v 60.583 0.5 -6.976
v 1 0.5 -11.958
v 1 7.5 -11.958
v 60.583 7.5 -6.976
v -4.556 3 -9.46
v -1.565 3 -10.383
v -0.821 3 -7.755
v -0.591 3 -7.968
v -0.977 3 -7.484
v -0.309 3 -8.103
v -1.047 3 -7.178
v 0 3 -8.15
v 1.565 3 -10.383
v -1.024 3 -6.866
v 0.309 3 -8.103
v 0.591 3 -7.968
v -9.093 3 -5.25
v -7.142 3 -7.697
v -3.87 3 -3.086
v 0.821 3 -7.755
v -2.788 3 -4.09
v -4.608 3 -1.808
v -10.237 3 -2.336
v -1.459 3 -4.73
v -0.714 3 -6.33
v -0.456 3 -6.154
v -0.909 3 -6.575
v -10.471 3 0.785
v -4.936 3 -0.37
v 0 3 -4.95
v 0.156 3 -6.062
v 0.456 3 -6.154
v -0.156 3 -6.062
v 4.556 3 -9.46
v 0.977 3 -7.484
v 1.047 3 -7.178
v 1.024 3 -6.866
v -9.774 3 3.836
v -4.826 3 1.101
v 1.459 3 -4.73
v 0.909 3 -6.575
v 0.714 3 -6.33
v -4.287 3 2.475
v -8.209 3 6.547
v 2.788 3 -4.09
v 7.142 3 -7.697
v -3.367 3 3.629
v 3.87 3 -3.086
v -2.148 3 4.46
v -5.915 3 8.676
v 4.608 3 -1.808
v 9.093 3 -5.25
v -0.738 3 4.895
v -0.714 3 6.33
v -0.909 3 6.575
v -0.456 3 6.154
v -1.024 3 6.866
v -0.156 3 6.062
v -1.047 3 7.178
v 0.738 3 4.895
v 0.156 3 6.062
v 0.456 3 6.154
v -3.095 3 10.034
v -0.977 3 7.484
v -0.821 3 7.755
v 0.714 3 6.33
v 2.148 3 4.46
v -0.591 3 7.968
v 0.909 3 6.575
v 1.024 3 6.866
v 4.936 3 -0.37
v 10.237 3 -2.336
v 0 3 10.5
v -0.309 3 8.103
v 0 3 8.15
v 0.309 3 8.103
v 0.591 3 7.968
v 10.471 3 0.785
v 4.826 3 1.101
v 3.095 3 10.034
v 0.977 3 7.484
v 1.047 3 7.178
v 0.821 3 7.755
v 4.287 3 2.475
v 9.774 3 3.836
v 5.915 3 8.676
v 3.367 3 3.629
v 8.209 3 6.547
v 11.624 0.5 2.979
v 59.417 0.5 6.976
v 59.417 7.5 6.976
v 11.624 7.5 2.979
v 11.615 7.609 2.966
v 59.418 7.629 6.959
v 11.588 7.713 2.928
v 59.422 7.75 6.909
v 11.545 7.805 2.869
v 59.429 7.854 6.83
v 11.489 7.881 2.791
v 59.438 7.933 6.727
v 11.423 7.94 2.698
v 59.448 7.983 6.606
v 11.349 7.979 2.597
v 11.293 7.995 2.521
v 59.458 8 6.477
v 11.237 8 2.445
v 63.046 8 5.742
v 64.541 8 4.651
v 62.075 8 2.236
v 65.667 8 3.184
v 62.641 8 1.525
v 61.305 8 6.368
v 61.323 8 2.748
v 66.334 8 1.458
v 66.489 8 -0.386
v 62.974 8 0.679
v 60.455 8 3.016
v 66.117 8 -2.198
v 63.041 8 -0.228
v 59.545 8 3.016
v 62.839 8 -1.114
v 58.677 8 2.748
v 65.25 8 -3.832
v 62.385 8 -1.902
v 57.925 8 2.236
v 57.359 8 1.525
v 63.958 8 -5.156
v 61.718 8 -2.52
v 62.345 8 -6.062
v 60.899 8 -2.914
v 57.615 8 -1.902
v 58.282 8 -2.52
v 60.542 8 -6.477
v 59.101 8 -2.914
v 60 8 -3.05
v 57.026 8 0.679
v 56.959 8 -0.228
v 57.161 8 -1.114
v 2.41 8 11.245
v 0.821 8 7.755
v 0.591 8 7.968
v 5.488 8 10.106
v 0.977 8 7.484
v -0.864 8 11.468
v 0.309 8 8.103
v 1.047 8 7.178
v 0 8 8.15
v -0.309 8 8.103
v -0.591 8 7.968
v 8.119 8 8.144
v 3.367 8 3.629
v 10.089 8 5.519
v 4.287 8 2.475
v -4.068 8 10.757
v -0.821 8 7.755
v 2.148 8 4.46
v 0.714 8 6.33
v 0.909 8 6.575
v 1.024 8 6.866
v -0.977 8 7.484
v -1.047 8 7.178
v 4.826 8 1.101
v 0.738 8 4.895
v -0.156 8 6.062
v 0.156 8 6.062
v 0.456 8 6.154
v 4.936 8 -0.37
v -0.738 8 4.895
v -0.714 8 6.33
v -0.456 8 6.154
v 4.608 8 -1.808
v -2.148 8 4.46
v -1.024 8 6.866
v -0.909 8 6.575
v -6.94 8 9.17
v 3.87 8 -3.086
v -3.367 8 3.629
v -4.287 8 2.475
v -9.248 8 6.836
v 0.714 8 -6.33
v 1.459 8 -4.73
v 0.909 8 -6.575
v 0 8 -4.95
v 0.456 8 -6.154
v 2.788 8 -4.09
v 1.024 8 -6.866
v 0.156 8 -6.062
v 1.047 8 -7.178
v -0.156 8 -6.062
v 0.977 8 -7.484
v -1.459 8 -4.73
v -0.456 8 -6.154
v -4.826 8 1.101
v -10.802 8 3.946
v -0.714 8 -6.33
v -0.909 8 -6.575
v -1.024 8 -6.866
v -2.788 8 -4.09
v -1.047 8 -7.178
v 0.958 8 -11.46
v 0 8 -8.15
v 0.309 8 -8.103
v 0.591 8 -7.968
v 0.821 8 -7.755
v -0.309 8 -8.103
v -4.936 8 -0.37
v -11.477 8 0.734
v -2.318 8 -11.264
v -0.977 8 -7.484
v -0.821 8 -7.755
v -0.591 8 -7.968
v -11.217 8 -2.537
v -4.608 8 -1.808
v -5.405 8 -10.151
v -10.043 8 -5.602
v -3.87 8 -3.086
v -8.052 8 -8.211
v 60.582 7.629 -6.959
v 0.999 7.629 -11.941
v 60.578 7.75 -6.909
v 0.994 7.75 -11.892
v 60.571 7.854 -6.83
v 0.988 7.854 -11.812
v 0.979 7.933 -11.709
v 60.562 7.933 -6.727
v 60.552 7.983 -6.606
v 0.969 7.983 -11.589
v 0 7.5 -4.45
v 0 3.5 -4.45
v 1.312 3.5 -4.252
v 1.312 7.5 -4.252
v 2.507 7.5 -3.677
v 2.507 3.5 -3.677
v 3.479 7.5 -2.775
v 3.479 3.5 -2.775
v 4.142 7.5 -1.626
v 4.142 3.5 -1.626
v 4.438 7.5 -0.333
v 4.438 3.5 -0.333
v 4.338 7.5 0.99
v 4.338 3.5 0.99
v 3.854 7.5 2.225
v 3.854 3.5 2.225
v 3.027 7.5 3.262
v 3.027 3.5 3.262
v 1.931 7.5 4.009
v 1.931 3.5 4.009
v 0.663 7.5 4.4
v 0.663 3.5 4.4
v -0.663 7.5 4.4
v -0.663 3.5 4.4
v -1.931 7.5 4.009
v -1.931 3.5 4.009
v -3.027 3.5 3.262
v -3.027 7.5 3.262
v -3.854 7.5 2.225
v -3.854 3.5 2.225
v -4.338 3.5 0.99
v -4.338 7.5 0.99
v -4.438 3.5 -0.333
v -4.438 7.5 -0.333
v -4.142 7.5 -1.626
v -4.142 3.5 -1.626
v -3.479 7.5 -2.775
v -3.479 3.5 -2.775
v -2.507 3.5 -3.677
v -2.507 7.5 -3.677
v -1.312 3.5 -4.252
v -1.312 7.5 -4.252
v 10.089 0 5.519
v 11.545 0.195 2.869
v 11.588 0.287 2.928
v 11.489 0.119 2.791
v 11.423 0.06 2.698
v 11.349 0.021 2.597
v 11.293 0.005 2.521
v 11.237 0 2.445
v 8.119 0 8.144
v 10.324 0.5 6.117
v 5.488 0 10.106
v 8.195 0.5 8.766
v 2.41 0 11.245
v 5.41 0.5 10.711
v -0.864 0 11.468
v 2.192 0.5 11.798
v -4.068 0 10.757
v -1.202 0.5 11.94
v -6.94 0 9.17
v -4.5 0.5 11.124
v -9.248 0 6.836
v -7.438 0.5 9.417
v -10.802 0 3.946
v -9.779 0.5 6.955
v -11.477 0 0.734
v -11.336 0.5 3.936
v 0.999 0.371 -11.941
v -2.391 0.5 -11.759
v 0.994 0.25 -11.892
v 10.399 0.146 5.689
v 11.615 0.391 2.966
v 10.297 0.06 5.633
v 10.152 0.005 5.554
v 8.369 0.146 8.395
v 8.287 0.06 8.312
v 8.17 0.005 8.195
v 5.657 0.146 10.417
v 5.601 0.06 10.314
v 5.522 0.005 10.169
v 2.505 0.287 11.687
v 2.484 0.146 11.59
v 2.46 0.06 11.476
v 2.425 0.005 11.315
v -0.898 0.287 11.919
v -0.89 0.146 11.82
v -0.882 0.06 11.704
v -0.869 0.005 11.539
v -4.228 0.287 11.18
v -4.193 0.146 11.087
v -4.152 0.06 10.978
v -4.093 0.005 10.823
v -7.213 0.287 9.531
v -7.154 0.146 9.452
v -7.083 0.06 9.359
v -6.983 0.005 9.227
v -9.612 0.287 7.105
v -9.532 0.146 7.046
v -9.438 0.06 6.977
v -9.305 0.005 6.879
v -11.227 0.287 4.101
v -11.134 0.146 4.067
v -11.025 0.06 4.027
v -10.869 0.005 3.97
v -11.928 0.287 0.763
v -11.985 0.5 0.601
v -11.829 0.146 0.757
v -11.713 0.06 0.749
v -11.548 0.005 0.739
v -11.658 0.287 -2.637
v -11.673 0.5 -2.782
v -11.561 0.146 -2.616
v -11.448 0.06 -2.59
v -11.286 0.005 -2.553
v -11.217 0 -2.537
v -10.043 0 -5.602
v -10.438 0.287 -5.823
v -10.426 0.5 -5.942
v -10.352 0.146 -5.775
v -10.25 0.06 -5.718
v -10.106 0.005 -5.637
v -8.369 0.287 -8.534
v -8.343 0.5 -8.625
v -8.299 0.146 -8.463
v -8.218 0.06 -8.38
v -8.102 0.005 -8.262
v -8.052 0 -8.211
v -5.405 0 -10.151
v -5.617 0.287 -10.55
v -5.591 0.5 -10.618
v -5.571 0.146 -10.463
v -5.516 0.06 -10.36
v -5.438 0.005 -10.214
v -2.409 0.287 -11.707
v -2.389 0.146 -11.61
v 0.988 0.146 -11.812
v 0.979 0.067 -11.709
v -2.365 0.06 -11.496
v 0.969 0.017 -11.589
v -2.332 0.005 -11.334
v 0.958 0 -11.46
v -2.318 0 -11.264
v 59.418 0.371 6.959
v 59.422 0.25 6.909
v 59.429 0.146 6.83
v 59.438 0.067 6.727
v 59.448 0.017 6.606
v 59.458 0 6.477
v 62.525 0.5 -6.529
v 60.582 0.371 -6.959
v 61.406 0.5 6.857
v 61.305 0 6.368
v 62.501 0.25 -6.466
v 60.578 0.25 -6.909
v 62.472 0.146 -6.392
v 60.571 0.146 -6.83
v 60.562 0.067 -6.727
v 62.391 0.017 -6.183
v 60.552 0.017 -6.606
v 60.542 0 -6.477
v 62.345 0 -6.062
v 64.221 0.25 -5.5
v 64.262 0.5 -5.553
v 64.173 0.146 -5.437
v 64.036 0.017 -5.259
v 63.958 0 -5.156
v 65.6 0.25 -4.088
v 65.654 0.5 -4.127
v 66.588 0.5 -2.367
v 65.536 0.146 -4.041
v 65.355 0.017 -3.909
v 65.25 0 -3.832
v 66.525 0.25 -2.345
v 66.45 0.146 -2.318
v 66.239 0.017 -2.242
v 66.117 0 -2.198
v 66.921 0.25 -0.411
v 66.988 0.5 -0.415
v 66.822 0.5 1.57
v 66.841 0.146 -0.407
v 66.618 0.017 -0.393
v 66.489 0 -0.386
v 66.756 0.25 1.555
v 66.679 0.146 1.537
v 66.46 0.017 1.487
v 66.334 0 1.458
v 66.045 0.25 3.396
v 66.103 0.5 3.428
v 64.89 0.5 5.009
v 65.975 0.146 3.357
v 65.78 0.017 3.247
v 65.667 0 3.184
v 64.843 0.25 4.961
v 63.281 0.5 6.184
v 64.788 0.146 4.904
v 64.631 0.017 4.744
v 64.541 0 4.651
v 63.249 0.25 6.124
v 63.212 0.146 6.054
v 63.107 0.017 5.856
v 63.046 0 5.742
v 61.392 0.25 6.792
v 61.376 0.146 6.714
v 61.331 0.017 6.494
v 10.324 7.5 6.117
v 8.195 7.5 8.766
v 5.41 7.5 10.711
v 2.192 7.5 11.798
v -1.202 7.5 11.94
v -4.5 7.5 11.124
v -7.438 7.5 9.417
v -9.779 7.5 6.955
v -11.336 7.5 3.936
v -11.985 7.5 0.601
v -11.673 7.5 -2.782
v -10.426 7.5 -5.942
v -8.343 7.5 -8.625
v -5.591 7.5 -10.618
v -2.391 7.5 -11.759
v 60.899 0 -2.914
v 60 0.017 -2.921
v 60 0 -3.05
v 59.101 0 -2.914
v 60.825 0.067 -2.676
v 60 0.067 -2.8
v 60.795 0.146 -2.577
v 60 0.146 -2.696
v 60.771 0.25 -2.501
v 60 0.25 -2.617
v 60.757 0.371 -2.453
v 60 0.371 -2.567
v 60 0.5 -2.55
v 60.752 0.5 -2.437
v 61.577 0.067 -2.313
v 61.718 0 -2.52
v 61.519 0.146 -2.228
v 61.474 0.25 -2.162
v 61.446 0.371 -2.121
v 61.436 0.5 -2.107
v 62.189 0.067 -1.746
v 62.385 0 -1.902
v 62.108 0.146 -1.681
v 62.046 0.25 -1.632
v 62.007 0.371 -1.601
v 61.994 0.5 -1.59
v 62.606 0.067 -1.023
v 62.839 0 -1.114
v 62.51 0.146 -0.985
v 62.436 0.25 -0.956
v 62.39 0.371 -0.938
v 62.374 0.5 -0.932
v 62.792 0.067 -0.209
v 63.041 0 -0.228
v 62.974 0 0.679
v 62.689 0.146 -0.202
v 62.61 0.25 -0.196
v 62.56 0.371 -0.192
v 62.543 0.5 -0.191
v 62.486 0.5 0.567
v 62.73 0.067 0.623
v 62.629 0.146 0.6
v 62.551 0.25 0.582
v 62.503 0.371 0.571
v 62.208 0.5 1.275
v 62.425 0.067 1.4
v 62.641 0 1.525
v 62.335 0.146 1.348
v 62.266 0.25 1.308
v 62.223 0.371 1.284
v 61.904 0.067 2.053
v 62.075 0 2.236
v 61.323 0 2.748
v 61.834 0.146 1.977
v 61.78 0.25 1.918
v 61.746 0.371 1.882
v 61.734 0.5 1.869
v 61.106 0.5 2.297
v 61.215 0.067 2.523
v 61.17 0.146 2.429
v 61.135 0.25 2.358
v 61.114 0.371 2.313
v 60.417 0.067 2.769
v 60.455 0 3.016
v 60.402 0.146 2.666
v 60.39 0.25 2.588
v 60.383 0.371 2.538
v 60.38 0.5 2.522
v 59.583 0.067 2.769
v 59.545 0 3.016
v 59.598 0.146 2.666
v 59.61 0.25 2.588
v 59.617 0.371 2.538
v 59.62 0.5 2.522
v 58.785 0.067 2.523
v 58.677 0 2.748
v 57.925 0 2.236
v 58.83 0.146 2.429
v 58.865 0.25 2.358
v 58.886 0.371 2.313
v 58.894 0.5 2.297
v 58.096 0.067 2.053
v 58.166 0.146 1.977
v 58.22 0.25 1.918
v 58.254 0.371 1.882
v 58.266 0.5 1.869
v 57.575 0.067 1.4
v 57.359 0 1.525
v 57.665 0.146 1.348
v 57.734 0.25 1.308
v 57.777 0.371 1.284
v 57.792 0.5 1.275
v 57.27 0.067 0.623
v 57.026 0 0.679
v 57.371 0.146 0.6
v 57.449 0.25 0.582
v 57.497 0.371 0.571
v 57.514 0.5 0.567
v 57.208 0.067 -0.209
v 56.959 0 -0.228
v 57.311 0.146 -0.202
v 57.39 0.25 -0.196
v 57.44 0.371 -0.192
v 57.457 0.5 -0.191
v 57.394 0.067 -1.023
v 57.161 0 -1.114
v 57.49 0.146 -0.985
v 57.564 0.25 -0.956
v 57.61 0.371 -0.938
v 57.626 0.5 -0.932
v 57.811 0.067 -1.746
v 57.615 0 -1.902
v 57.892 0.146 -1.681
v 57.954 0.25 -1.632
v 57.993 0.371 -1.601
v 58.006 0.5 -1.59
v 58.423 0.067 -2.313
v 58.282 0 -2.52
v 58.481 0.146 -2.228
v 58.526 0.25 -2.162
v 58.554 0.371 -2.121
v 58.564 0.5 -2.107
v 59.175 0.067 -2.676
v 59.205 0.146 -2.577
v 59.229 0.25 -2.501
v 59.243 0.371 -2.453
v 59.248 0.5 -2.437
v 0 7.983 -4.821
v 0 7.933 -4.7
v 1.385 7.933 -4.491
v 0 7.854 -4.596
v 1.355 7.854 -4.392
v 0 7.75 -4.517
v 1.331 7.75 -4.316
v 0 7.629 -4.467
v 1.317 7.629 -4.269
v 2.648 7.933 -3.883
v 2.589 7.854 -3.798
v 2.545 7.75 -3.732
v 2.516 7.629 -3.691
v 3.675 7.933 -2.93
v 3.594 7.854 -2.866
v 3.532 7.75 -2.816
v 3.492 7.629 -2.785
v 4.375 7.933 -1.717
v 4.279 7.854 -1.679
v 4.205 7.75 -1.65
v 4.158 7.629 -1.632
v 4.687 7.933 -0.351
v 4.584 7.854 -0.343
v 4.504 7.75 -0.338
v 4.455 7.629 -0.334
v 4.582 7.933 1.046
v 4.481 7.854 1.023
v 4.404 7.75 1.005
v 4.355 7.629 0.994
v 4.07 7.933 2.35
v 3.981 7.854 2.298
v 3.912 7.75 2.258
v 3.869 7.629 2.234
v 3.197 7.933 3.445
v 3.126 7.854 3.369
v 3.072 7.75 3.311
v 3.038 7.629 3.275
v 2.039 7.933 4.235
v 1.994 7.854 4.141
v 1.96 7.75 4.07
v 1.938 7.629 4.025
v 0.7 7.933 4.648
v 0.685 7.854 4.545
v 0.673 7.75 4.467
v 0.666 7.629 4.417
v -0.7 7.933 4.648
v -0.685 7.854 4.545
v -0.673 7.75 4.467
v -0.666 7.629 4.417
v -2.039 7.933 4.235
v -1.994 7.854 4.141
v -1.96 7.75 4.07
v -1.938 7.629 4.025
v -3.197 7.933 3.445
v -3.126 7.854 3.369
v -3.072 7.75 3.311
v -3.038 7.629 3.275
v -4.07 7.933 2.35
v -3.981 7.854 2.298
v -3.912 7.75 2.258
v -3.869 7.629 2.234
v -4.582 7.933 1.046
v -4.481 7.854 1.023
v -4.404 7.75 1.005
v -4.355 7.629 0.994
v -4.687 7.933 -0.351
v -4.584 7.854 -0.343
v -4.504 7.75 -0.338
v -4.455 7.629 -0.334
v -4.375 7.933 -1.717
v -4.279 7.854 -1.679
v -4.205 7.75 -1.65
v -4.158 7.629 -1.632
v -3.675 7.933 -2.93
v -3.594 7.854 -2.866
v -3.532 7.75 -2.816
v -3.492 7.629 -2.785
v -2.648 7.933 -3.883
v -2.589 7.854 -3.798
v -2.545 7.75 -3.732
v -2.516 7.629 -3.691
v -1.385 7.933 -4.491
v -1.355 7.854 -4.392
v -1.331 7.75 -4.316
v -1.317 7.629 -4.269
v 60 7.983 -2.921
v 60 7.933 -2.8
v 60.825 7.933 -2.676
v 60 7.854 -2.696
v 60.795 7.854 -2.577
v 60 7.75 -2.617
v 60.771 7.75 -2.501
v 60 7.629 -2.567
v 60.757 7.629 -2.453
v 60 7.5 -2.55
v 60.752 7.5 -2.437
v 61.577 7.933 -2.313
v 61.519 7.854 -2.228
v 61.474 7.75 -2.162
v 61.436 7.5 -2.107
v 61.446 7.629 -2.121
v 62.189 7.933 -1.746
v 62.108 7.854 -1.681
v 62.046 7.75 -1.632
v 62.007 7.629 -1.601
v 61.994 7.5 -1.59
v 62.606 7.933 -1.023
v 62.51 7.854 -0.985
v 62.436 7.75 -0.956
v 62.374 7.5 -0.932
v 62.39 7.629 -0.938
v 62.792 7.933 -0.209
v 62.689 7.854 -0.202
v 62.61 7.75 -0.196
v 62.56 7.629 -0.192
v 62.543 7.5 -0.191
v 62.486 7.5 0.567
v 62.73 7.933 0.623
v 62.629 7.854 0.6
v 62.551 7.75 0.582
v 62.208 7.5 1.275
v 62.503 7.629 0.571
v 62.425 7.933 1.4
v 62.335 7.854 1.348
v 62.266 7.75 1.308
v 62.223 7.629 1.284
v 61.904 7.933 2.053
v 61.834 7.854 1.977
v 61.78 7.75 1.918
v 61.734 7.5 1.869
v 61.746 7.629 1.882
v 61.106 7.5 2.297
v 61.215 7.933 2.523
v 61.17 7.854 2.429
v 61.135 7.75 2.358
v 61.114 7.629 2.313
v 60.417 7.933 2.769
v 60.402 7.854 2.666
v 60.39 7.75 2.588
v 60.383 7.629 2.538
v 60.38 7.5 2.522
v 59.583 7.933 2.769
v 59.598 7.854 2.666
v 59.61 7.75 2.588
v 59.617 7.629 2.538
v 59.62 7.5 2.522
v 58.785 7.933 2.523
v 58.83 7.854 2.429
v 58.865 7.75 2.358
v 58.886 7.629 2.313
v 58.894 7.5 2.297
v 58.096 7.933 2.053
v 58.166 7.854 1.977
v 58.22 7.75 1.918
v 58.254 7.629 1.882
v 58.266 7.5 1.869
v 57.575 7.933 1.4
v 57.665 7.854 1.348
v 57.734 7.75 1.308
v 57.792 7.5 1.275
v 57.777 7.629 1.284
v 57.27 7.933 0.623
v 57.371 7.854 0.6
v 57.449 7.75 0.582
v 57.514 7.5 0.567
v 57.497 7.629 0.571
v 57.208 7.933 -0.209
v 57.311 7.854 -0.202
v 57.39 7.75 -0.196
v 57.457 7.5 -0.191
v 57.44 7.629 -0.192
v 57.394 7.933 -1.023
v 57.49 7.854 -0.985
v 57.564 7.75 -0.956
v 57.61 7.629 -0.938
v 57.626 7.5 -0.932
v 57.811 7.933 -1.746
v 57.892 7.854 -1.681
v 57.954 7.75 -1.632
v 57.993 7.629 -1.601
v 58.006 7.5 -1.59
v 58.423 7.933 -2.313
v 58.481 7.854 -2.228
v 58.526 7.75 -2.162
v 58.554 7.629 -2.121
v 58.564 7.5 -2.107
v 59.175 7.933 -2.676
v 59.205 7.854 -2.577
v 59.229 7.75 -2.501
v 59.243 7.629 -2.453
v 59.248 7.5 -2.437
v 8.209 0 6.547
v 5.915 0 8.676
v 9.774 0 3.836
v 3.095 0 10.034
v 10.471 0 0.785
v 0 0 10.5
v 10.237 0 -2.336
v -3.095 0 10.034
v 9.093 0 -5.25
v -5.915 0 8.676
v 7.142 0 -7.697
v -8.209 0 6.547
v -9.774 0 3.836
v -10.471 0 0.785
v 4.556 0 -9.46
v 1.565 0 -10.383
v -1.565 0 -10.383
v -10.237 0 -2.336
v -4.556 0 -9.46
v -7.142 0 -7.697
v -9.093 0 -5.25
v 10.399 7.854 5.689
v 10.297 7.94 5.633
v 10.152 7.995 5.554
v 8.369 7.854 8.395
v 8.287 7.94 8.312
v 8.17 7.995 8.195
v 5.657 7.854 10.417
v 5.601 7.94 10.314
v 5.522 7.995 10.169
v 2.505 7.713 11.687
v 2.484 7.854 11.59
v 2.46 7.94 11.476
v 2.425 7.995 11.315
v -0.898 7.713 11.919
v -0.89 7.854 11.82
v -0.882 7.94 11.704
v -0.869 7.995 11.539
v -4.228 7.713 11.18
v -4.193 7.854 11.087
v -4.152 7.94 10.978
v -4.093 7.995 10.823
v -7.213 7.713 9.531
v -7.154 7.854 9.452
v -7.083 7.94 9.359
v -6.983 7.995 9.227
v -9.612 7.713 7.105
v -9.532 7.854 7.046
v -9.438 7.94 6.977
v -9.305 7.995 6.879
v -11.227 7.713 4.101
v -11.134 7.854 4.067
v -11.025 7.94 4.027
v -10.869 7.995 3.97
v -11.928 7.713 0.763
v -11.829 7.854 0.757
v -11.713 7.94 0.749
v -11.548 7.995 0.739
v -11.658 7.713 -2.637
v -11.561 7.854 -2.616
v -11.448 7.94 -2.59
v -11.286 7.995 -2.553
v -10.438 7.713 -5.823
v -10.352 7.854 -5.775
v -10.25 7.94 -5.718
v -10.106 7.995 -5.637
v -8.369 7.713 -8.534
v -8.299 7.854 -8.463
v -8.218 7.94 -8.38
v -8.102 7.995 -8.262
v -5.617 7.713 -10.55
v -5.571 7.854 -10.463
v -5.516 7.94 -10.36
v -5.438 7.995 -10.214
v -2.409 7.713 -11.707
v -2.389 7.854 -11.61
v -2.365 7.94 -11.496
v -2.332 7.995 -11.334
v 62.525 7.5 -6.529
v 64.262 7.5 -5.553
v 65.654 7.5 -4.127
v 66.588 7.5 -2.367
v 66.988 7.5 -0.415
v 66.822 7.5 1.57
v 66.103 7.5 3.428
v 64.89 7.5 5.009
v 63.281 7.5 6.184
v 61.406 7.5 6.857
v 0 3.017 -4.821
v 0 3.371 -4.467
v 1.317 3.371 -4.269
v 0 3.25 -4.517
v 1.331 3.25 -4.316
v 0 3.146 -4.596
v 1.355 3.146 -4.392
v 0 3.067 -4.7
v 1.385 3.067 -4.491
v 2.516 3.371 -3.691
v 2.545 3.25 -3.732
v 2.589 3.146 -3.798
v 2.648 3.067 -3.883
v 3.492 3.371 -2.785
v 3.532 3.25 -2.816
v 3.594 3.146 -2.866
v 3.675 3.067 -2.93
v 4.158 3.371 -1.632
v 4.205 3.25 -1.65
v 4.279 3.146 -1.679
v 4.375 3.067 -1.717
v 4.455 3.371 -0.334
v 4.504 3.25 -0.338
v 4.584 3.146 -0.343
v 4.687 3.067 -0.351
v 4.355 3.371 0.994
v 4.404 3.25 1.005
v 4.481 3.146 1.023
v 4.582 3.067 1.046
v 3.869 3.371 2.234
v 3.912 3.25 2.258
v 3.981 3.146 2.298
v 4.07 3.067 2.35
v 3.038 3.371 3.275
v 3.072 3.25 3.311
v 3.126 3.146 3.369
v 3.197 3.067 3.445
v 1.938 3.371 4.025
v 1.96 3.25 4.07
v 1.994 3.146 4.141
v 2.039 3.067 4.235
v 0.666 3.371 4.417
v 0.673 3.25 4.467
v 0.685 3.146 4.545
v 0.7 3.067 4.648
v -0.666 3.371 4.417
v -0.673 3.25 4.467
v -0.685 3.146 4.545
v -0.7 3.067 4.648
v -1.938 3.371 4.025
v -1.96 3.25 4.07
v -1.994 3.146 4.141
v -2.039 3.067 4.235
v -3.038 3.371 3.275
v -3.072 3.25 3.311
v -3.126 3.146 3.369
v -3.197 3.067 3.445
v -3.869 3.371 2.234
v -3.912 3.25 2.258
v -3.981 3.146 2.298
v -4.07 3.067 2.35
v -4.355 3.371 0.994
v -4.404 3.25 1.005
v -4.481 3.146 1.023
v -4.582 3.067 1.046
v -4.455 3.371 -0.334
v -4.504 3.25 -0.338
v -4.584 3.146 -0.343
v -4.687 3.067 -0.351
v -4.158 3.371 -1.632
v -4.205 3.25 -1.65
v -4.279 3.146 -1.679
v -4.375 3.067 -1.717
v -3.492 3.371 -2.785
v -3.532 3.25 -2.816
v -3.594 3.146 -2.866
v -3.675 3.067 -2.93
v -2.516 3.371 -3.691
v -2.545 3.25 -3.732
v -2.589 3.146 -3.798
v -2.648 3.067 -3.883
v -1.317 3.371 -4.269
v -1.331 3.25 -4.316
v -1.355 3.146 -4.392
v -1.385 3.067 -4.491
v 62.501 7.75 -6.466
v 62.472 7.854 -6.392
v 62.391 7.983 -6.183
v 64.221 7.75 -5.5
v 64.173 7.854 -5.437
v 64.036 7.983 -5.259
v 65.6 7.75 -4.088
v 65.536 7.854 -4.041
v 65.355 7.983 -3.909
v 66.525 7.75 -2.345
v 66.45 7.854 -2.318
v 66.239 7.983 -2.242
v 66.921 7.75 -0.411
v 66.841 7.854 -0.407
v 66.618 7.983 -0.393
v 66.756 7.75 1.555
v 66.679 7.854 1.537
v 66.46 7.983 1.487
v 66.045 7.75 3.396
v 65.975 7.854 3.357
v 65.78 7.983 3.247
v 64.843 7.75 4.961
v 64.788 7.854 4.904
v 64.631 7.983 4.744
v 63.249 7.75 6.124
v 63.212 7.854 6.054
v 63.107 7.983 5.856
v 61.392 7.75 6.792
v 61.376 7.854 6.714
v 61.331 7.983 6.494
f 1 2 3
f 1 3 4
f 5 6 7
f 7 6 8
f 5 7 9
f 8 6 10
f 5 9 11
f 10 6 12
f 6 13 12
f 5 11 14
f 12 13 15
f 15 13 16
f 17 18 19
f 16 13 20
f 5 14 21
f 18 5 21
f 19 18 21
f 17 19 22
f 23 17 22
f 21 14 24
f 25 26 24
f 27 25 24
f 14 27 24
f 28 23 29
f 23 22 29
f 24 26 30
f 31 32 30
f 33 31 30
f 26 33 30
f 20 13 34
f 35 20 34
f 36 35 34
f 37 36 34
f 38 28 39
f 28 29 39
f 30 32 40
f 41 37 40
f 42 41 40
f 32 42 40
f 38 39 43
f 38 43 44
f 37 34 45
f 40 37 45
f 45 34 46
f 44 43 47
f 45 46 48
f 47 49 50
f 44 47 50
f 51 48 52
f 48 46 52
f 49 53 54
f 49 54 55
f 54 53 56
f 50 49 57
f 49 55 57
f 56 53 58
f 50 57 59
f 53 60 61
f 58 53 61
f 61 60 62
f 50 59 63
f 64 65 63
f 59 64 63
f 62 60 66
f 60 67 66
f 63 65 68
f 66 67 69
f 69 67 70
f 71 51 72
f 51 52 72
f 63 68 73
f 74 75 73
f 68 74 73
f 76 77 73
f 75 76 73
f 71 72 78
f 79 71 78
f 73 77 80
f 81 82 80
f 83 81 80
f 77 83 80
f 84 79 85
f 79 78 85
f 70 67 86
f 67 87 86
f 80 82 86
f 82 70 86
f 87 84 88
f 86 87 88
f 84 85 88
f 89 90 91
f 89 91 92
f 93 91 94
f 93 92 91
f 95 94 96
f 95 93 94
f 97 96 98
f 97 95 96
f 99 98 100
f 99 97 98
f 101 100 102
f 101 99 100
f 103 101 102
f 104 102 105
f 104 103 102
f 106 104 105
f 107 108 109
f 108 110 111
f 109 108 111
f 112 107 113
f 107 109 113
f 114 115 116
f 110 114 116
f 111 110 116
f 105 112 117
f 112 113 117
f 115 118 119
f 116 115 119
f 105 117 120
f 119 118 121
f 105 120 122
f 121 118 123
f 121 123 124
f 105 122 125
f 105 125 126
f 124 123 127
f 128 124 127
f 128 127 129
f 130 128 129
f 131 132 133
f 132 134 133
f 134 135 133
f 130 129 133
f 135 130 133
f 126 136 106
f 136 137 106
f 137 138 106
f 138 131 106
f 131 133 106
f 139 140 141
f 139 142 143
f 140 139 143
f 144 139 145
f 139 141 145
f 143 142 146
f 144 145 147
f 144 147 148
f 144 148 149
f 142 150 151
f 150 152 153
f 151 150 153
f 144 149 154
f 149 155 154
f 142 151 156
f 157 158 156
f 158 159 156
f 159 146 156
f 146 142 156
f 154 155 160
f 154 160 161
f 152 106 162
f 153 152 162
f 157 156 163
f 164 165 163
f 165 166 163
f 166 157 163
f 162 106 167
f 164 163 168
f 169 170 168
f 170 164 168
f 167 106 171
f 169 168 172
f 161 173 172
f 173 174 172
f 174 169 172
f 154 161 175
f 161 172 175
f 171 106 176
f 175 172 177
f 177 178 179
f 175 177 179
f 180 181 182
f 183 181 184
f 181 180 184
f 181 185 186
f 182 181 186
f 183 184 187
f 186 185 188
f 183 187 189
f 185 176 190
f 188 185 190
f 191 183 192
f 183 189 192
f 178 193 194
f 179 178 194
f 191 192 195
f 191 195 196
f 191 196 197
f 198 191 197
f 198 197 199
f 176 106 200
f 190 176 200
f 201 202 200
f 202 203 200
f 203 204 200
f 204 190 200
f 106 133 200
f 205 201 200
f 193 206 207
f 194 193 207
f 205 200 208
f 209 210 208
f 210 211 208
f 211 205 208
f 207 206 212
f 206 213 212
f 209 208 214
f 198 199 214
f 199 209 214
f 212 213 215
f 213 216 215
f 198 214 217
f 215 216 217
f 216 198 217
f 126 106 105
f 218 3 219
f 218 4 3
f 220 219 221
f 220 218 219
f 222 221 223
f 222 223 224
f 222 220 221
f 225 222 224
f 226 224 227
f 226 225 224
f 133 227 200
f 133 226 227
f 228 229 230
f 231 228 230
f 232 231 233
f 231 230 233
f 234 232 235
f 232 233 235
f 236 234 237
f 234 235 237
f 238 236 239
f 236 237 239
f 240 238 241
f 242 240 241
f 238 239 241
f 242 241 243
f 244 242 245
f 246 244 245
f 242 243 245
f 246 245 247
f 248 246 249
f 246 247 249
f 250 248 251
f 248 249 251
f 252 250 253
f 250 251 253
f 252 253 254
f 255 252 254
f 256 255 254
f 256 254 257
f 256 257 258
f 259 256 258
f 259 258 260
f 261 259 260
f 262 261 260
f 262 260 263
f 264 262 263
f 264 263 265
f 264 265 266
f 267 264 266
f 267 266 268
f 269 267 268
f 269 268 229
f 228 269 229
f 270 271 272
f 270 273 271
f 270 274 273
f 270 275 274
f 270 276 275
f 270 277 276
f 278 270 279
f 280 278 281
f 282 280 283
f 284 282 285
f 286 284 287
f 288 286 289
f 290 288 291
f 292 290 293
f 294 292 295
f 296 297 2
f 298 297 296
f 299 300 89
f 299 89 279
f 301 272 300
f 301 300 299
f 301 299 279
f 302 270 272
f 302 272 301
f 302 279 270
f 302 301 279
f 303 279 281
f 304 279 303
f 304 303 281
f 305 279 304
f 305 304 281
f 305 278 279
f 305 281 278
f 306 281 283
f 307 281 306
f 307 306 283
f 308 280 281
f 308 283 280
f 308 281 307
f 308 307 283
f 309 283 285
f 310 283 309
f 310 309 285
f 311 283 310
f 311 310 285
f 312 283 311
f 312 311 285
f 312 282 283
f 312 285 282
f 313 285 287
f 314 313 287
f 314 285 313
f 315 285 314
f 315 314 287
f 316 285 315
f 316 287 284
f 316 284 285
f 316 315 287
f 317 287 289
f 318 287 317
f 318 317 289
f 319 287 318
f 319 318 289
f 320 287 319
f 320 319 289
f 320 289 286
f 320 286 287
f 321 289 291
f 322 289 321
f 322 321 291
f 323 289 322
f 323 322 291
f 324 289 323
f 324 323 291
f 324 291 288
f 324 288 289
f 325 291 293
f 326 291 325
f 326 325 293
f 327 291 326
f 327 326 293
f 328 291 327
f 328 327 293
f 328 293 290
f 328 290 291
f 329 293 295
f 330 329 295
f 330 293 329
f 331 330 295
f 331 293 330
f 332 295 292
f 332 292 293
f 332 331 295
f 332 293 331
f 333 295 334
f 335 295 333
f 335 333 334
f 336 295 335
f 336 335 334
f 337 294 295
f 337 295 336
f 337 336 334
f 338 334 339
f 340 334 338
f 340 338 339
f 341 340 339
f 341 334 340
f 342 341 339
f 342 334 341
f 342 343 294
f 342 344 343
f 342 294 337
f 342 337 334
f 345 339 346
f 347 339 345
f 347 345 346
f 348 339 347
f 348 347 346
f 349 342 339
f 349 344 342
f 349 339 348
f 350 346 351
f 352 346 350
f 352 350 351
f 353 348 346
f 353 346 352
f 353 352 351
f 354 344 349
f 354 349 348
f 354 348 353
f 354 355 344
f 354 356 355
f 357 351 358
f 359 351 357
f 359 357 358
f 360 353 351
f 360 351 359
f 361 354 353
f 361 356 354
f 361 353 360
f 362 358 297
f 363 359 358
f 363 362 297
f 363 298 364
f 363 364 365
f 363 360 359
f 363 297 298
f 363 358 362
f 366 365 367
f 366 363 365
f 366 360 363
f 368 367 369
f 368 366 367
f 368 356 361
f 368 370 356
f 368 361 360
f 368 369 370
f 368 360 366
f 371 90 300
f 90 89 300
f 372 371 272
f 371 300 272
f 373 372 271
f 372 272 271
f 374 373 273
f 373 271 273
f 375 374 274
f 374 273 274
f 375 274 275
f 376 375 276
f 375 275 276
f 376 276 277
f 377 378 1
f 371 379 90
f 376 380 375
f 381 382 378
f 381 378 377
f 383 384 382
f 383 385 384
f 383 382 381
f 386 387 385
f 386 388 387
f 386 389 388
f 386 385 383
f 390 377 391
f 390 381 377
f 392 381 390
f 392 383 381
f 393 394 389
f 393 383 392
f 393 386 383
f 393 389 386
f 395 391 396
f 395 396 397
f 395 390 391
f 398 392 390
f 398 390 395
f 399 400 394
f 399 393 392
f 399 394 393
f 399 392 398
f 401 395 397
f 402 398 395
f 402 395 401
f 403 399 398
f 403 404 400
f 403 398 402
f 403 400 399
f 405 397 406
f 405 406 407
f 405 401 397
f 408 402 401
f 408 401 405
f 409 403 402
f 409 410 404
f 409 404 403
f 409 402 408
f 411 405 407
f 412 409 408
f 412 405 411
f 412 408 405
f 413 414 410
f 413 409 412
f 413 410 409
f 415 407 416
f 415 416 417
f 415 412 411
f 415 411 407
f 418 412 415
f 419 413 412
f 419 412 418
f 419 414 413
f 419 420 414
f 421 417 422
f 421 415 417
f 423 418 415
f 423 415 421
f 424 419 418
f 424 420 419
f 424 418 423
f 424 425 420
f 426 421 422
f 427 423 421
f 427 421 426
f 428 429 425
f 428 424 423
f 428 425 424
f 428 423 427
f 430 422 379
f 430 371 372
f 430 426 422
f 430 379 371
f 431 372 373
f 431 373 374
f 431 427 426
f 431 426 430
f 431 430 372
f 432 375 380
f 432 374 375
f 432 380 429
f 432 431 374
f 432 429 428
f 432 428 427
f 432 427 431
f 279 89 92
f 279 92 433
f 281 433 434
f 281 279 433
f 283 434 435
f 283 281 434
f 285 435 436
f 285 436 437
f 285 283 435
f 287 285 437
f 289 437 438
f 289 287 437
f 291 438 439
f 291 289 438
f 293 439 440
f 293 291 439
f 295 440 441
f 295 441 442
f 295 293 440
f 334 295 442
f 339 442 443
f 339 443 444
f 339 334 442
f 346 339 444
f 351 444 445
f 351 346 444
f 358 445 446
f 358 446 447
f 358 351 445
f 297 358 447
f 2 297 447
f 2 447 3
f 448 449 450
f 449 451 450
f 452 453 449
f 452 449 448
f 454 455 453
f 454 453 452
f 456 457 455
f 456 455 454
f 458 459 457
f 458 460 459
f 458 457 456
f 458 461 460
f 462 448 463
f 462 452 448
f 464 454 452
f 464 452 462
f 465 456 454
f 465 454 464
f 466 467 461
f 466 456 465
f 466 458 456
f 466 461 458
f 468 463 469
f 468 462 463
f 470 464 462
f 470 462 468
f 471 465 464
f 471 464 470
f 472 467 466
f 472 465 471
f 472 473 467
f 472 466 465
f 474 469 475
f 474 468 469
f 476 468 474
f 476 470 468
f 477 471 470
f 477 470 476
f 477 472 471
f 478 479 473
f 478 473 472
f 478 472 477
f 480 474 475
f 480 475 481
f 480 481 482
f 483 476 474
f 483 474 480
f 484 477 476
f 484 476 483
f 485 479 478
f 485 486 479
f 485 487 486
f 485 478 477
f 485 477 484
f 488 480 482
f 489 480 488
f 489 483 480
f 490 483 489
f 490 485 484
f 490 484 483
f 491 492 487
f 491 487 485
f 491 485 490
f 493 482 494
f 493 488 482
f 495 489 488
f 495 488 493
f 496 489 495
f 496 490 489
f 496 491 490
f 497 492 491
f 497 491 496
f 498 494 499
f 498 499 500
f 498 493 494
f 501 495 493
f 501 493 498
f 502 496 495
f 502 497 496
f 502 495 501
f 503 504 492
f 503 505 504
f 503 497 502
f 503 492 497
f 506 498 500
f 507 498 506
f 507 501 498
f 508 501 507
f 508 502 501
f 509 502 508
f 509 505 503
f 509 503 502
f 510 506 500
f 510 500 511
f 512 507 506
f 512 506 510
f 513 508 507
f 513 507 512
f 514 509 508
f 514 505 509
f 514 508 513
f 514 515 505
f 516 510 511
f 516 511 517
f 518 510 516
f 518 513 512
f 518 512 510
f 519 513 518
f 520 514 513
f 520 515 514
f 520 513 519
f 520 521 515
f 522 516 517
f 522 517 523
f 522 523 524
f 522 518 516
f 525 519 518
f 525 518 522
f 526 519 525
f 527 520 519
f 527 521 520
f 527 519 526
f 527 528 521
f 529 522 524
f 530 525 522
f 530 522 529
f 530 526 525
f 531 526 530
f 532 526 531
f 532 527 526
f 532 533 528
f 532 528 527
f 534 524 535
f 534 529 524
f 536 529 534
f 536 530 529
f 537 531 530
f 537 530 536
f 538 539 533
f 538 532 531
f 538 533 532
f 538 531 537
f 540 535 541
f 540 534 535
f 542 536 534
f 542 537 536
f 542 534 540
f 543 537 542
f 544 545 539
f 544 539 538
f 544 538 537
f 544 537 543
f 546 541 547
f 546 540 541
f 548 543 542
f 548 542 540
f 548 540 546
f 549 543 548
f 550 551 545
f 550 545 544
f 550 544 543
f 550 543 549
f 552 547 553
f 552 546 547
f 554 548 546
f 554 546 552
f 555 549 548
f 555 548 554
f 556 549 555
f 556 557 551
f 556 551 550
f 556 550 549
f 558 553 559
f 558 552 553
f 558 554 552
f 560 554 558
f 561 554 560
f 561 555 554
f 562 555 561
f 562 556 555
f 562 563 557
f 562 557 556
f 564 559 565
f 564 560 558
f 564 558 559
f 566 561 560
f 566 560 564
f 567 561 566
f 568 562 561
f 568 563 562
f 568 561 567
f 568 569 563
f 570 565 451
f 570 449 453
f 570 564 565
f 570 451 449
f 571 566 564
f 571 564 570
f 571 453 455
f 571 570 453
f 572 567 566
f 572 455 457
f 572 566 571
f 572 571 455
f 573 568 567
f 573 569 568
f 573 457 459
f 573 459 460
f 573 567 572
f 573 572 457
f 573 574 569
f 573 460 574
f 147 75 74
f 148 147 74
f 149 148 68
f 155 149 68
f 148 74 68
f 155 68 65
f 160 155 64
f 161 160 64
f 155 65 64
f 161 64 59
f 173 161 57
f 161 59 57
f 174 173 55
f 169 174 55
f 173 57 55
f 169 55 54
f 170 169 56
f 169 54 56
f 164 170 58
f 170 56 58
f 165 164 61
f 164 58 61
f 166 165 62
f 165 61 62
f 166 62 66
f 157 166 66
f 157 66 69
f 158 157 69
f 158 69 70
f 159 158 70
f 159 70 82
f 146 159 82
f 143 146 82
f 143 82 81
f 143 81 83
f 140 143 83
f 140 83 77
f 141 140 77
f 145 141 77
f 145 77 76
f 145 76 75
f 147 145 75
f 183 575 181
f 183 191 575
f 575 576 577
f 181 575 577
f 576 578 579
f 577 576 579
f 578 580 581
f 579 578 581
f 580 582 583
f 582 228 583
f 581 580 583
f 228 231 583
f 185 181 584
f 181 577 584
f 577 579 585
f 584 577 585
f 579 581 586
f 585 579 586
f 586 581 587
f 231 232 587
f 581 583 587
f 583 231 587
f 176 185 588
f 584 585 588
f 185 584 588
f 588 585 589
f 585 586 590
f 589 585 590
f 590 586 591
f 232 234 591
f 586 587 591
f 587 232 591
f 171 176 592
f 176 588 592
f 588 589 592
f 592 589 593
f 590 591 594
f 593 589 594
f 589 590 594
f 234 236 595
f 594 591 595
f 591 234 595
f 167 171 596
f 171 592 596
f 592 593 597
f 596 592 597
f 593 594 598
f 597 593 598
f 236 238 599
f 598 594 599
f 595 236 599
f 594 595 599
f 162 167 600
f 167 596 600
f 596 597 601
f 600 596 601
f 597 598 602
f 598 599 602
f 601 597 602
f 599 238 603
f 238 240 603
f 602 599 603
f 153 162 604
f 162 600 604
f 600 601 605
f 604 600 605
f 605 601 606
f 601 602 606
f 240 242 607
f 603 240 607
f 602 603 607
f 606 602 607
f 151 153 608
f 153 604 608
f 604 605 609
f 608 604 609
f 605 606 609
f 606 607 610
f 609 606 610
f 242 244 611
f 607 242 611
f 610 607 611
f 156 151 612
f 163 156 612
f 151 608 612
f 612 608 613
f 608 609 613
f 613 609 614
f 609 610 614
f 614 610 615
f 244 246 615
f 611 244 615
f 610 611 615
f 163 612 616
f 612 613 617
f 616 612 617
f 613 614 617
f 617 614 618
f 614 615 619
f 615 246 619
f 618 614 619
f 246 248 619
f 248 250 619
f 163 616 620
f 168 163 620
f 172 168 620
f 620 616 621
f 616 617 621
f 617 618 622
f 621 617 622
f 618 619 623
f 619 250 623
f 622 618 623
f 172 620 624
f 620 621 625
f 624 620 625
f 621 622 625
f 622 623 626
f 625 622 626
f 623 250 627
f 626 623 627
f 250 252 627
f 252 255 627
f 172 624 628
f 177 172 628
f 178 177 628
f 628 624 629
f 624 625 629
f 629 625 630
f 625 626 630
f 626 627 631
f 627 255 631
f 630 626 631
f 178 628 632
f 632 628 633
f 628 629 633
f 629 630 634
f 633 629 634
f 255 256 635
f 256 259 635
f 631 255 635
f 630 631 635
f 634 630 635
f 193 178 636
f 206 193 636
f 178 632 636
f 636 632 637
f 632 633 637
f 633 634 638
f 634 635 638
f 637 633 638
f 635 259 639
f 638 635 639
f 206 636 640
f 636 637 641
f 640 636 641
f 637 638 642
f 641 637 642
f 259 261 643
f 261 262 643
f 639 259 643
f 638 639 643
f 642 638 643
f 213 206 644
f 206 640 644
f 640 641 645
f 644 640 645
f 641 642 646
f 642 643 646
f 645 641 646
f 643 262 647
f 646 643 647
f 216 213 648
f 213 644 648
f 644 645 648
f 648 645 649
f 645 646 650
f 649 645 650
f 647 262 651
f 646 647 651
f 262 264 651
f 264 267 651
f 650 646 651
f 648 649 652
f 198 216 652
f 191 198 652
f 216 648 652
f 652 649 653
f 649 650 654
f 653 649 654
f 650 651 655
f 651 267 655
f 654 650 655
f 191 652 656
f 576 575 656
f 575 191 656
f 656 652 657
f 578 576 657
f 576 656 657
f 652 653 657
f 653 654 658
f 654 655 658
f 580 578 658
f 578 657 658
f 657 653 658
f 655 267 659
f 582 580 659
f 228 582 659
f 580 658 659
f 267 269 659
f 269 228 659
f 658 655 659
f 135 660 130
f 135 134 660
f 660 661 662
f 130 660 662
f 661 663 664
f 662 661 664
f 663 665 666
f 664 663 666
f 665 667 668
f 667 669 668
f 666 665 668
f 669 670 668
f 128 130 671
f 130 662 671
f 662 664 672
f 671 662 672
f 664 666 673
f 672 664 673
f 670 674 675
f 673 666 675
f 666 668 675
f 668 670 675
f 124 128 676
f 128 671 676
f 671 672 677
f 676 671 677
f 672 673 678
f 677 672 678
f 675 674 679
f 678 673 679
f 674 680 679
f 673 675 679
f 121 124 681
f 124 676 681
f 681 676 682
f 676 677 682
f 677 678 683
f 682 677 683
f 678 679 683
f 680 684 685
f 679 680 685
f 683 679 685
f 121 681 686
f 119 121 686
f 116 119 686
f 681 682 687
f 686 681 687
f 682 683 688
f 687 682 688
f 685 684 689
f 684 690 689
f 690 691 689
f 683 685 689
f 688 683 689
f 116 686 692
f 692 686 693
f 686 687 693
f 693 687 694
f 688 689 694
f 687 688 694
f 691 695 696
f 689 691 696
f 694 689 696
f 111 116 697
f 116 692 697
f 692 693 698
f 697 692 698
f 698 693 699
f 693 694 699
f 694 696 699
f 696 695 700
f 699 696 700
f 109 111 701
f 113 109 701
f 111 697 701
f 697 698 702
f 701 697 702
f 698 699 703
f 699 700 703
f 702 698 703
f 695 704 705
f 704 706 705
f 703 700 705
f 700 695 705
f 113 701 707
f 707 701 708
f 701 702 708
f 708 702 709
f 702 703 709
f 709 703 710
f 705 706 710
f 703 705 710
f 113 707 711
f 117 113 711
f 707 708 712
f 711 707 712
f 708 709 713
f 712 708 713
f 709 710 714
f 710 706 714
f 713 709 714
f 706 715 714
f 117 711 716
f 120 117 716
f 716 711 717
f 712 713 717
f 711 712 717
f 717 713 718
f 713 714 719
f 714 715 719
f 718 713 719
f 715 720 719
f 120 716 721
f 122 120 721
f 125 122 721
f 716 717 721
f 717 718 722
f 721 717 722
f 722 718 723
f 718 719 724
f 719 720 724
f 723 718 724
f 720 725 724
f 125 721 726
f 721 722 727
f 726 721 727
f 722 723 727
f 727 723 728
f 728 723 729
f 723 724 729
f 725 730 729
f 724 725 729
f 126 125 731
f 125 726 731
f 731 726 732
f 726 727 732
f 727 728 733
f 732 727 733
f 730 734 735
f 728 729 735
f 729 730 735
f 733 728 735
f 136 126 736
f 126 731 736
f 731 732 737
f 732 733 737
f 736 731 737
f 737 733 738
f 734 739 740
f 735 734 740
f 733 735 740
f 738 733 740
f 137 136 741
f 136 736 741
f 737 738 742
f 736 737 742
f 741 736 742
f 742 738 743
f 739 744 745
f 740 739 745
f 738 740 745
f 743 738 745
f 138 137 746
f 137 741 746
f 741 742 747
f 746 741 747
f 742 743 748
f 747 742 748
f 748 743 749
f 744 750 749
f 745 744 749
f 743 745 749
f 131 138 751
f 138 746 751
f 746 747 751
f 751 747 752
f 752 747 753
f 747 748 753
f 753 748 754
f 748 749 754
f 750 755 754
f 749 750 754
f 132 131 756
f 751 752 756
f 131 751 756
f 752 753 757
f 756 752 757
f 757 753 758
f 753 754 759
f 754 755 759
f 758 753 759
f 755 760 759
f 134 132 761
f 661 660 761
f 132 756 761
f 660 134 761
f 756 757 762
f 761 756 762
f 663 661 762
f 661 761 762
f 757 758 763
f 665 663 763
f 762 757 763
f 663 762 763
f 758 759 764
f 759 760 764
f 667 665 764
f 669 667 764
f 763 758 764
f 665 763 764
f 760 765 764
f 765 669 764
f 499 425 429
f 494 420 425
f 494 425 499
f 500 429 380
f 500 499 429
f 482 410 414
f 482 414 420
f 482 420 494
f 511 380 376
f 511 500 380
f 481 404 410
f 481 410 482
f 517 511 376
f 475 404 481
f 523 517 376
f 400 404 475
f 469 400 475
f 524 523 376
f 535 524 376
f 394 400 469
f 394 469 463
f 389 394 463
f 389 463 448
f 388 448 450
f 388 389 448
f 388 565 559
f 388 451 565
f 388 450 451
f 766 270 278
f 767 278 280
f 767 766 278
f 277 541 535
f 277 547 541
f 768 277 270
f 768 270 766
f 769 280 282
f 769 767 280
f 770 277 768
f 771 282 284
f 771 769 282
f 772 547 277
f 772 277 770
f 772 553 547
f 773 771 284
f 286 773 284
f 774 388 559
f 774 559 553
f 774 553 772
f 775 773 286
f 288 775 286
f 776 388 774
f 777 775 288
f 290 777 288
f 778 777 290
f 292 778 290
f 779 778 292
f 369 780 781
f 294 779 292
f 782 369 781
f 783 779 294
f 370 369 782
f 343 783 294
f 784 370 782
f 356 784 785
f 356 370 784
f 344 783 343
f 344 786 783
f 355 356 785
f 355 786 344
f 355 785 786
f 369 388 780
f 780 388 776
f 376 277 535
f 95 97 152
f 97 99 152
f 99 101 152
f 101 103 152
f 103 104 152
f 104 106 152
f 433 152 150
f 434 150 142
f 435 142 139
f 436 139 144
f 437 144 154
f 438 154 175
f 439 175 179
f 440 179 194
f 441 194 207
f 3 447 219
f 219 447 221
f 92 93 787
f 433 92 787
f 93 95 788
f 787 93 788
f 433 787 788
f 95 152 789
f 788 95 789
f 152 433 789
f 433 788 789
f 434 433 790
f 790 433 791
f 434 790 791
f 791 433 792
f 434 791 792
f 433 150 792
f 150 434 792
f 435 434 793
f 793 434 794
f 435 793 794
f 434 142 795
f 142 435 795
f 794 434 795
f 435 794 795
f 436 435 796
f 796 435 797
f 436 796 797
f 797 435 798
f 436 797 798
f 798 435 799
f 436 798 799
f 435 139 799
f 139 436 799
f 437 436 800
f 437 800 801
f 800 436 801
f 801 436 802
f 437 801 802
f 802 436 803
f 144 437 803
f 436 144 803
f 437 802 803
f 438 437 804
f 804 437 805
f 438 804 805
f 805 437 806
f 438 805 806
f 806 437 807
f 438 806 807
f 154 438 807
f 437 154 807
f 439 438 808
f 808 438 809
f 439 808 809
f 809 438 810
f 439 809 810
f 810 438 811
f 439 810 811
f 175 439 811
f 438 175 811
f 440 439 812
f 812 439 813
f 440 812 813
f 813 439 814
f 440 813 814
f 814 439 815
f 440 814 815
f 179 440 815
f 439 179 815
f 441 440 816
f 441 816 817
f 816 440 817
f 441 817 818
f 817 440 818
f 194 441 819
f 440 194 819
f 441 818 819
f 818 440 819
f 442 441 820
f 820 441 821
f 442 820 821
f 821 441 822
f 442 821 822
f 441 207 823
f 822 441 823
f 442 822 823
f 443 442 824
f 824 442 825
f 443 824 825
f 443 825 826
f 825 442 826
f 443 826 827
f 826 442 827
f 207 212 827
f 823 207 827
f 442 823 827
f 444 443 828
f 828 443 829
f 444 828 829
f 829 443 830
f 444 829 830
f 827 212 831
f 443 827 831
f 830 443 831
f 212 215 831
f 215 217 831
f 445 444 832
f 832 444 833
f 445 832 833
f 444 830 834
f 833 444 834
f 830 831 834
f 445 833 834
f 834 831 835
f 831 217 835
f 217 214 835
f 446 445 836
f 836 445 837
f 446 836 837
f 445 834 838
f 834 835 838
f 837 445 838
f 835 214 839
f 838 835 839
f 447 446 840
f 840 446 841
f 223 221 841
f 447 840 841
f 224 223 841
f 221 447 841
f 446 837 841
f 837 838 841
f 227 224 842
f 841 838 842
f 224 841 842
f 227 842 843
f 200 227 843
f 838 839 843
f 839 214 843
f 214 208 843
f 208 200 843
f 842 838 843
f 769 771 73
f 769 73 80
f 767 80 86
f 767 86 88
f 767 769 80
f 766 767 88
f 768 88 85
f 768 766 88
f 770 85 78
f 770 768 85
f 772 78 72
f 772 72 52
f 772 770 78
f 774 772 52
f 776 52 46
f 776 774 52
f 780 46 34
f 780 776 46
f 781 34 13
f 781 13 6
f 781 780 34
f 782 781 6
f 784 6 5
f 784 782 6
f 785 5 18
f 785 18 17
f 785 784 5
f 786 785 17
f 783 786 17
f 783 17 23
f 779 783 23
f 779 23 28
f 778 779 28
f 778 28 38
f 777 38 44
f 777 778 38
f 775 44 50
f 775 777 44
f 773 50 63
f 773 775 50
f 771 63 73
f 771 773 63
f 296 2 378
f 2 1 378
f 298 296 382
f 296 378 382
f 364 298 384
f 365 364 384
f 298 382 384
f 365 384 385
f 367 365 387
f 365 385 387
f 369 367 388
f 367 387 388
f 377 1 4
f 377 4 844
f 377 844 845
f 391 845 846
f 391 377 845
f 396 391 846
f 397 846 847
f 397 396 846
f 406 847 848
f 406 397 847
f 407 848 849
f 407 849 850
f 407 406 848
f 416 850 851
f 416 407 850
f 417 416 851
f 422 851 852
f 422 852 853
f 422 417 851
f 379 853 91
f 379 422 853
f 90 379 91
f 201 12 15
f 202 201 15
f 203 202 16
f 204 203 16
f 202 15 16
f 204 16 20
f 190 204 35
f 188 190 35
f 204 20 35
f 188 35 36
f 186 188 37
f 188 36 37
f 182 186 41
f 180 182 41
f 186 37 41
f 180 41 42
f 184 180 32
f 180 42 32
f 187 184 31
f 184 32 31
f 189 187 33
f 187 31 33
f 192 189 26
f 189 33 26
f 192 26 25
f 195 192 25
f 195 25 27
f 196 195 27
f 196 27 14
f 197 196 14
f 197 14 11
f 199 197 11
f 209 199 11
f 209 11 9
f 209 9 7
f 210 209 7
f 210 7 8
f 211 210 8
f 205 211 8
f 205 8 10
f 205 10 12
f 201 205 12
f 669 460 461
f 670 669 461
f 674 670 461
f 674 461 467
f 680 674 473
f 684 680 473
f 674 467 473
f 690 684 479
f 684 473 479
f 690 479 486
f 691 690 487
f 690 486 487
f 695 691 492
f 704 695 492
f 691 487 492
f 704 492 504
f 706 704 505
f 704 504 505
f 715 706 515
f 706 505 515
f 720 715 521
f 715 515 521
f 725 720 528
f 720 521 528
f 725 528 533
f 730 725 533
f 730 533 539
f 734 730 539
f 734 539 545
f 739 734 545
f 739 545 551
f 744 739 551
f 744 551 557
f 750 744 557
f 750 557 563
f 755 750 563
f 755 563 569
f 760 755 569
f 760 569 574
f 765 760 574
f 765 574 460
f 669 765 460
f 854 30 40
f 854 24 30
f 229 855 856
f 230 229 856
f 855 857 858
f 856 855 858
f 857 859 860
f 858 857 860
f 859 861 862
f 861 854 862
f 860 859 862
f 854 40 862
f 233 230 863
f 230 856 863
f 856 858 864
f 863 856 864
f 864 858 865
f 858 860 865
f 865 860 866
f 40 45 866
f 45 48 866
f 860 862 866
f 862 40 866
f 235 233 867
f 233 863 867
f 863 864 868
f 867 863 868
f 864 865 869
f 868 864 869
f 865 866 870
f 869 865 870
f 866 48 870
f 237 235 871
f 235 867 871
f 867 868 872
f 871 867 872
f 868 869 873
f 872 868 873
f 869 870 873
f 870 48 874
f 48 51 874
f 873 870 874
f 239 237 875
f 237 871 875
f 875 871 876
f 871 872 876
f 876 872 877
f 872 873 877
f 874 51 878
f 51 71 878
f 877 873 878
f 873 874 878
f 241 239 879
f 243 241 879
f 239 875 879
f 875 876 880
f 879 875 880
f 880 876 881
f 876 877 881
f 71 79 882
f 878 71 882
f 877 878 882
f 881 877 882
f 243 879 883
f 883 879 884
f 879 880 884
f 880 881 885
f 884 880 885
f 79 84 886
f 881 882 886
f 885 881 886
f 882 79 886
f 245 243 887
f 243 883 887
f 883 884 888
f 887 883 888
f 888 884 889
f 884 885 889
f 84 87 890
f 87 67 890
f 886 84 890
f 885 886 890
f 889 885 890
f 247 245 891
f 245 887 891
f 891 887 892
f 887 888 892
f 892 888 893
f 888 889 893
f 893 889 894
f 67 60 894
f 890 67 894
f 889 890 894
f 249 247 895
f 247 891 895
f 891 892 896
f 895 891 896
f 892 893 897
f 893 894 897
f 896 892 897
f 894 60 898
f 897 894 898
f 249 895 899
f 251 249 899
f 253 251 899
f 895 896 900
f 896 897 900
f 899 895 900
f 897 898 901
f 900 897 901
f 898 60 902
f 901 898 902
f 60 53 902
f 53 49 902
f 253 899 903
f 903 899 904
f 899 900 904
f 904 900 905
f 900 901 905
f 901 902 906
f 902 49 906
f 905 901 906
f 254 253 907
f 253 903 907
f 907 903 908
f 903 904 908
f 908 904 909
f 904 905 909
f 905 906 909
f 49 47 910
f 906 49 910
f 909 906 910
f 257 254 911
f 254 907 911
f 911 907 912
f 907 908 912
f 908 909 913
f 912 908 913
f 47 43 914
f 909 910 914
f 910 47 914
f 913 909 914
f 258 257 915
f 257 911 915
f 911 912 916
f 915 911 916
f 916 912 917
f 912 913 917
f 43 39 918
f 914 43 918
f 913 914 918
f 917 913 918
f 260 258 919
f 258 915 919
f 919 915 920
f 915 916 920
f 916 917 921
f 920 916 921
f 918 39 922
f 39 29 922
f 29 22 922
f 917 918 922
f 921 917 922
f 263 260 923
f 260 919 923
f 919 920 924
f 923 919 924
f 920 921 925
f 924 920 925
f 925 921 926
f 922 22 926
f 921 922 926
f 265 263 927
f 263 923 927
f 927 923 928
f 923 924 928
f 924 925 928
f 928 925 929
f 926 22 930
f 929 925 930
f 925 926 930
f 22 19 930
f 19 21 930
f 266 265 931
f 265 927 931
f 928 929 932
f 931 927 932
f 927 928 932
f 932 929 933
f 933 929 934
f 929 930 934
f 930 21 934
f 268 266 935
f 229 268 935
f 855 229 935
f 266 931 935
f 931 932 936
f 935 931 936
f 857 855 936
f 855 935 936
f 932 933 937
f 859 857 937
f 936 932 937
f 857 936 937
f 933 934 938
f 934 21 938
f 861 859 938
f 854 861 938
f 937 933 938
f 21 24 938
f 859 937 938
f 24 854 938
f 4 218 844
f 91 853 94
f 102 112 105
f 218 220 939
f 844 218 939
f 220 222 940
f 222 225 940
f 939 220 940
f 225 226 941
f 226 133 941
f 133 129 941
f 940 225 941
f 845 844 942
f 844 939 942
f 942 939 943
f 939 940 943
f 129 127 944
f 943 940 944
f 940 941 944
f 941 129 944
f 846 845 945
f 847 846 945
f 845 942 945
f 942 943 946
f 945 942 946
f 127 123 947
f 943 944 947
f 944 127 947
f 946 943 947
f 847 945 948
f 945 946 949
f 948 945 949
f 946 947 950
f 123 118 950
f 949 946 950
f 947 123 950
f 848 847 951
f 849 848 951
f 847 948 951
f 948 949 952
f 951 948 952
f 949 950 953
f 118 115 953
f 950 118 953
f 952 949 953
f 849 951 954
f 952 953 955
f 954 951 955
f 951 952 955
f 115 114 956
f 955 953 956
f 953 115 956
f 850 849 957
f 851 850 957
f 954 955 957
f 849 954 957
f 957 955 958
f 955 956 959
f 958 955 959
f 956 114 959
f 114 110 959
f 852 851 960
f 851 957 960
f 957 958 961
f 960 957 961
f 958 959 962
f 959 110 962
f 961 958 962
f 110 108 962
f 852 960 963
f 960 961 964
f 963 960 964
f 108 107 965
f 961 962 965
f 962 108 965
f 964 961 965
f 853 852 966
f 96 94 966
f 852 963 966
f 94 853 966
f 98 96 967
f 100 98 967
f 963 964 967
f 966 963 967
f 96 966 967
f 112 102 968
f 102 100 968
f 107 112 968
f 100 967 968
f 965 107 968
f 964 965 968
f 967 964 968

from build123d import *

# Parameters (mm, degrees)
EXTRUDE_1_DEPTH     = 8
SKETCH_2_R          = 10.5
CUT_EXTRUDE_1_DEPTH = 3
SKETCH_3_R          = 4.45
SKETCH_3_R_2        = 1.05
CUT_EXTRUDE_2_DEPTH = 69.249542123
SKETCH_4_R          = 2.55
CUT_EXTRUDE_3_DEPTH = 69.534662763
FILLET_1_R          = 0.5
FILLET_2_R          = 0.5


with BuildPart() as part:
    # 草图1 → 凸台-拉伸1 (new body)
    with BuildSketch(Plane(origin=(0, 0, 0), x_dir=(1, 0, 0), z_dir=(0, 1, 0))):
        with BuildLine():
            Line((1, 11.958260743), (60.583333333, 6.9756521))
            ThreePointArc((60.583333333, 6.9756521), (66.9756521, -0.583333333), (59.416666667, -6.9756521))
            Line((59.416666667, -6.9756521), (11.624337437, -2.979056754))
            ThreePointArc((11.624337437, -2.979056754), (-9.77876973, -6.955261502), (1, 11.958260743))
        make_face()
    extrude(amount=EXTRUDE_1_DEPTH)

    # 草图2 → 切除-拉伸1 (cut)
    with BuildSketch(Plane(origin=(0, 0, 0), x_dir=(1, 0, 0), z_dir=(0, 1, 0))):
        Circle(SKETCH_2_R)
    extrude(amount=CUT_EXTRUDE_1_DEPTH, mode=Mode.SUBTRACT)

    # 草图3 → 切除-拉伸2 (cut, through all)
    with BuildSketch(Plane.XZ.offset(-3)):
        Circle(SKETCH_3_R)
        with Locations((0, -7.1)):
            Circle(SKETCH_3_R_2)
        with Locations((0, 7.1)):
            Circle(SKETCH_3_R_2)
    extrude(amount=-CUT_EXTRUDE_2_DEPTH, mode=Mode.SUBTRACT)

    # 草图4 → 切除-拉伸3 (cut, through all)
    with BuildSketch(Plane.XZ):
        with Locations((60, 0)):
            Circle(SKETCH_4_R)
    extrude(amount=-CUT_EXTRUDE_3_DEPTH, mode=Mode.SUBTRACT)

    # 圆角1
    fillet_1_edges = [part.edges().sort_by_distance(p)[0] for p in [
        (35.520502052, 8, 4.977354427),
        (66.9756521, 8, 0.583333333),
        (30.791666667, 8, -9.466956422),
        (35.520502052, 0, 4.977354427),
        (66.9756521, 0, 0.583333333),
        (-9.77876973, 0, 6.955261502),
        (-9.77876973, 8, 6.955261502),
        (30.791666667, 0, -9.466956422),
    ]]
    fillet(fillet_1_edges, radius=FILLET_1_R)

    # 圆角2
    fillet_2_edges = [part.edges().sort_by_distance(p)[0] for p in [
        (-4.45, 3, 0),
        (-4.45, 8, 0),
        (57.45, 8, 0),
        (57.45, 0, 0),
    ]]
    fillet(fillet_2_edges, radius=FILLET_2_R)


solid = part.part
